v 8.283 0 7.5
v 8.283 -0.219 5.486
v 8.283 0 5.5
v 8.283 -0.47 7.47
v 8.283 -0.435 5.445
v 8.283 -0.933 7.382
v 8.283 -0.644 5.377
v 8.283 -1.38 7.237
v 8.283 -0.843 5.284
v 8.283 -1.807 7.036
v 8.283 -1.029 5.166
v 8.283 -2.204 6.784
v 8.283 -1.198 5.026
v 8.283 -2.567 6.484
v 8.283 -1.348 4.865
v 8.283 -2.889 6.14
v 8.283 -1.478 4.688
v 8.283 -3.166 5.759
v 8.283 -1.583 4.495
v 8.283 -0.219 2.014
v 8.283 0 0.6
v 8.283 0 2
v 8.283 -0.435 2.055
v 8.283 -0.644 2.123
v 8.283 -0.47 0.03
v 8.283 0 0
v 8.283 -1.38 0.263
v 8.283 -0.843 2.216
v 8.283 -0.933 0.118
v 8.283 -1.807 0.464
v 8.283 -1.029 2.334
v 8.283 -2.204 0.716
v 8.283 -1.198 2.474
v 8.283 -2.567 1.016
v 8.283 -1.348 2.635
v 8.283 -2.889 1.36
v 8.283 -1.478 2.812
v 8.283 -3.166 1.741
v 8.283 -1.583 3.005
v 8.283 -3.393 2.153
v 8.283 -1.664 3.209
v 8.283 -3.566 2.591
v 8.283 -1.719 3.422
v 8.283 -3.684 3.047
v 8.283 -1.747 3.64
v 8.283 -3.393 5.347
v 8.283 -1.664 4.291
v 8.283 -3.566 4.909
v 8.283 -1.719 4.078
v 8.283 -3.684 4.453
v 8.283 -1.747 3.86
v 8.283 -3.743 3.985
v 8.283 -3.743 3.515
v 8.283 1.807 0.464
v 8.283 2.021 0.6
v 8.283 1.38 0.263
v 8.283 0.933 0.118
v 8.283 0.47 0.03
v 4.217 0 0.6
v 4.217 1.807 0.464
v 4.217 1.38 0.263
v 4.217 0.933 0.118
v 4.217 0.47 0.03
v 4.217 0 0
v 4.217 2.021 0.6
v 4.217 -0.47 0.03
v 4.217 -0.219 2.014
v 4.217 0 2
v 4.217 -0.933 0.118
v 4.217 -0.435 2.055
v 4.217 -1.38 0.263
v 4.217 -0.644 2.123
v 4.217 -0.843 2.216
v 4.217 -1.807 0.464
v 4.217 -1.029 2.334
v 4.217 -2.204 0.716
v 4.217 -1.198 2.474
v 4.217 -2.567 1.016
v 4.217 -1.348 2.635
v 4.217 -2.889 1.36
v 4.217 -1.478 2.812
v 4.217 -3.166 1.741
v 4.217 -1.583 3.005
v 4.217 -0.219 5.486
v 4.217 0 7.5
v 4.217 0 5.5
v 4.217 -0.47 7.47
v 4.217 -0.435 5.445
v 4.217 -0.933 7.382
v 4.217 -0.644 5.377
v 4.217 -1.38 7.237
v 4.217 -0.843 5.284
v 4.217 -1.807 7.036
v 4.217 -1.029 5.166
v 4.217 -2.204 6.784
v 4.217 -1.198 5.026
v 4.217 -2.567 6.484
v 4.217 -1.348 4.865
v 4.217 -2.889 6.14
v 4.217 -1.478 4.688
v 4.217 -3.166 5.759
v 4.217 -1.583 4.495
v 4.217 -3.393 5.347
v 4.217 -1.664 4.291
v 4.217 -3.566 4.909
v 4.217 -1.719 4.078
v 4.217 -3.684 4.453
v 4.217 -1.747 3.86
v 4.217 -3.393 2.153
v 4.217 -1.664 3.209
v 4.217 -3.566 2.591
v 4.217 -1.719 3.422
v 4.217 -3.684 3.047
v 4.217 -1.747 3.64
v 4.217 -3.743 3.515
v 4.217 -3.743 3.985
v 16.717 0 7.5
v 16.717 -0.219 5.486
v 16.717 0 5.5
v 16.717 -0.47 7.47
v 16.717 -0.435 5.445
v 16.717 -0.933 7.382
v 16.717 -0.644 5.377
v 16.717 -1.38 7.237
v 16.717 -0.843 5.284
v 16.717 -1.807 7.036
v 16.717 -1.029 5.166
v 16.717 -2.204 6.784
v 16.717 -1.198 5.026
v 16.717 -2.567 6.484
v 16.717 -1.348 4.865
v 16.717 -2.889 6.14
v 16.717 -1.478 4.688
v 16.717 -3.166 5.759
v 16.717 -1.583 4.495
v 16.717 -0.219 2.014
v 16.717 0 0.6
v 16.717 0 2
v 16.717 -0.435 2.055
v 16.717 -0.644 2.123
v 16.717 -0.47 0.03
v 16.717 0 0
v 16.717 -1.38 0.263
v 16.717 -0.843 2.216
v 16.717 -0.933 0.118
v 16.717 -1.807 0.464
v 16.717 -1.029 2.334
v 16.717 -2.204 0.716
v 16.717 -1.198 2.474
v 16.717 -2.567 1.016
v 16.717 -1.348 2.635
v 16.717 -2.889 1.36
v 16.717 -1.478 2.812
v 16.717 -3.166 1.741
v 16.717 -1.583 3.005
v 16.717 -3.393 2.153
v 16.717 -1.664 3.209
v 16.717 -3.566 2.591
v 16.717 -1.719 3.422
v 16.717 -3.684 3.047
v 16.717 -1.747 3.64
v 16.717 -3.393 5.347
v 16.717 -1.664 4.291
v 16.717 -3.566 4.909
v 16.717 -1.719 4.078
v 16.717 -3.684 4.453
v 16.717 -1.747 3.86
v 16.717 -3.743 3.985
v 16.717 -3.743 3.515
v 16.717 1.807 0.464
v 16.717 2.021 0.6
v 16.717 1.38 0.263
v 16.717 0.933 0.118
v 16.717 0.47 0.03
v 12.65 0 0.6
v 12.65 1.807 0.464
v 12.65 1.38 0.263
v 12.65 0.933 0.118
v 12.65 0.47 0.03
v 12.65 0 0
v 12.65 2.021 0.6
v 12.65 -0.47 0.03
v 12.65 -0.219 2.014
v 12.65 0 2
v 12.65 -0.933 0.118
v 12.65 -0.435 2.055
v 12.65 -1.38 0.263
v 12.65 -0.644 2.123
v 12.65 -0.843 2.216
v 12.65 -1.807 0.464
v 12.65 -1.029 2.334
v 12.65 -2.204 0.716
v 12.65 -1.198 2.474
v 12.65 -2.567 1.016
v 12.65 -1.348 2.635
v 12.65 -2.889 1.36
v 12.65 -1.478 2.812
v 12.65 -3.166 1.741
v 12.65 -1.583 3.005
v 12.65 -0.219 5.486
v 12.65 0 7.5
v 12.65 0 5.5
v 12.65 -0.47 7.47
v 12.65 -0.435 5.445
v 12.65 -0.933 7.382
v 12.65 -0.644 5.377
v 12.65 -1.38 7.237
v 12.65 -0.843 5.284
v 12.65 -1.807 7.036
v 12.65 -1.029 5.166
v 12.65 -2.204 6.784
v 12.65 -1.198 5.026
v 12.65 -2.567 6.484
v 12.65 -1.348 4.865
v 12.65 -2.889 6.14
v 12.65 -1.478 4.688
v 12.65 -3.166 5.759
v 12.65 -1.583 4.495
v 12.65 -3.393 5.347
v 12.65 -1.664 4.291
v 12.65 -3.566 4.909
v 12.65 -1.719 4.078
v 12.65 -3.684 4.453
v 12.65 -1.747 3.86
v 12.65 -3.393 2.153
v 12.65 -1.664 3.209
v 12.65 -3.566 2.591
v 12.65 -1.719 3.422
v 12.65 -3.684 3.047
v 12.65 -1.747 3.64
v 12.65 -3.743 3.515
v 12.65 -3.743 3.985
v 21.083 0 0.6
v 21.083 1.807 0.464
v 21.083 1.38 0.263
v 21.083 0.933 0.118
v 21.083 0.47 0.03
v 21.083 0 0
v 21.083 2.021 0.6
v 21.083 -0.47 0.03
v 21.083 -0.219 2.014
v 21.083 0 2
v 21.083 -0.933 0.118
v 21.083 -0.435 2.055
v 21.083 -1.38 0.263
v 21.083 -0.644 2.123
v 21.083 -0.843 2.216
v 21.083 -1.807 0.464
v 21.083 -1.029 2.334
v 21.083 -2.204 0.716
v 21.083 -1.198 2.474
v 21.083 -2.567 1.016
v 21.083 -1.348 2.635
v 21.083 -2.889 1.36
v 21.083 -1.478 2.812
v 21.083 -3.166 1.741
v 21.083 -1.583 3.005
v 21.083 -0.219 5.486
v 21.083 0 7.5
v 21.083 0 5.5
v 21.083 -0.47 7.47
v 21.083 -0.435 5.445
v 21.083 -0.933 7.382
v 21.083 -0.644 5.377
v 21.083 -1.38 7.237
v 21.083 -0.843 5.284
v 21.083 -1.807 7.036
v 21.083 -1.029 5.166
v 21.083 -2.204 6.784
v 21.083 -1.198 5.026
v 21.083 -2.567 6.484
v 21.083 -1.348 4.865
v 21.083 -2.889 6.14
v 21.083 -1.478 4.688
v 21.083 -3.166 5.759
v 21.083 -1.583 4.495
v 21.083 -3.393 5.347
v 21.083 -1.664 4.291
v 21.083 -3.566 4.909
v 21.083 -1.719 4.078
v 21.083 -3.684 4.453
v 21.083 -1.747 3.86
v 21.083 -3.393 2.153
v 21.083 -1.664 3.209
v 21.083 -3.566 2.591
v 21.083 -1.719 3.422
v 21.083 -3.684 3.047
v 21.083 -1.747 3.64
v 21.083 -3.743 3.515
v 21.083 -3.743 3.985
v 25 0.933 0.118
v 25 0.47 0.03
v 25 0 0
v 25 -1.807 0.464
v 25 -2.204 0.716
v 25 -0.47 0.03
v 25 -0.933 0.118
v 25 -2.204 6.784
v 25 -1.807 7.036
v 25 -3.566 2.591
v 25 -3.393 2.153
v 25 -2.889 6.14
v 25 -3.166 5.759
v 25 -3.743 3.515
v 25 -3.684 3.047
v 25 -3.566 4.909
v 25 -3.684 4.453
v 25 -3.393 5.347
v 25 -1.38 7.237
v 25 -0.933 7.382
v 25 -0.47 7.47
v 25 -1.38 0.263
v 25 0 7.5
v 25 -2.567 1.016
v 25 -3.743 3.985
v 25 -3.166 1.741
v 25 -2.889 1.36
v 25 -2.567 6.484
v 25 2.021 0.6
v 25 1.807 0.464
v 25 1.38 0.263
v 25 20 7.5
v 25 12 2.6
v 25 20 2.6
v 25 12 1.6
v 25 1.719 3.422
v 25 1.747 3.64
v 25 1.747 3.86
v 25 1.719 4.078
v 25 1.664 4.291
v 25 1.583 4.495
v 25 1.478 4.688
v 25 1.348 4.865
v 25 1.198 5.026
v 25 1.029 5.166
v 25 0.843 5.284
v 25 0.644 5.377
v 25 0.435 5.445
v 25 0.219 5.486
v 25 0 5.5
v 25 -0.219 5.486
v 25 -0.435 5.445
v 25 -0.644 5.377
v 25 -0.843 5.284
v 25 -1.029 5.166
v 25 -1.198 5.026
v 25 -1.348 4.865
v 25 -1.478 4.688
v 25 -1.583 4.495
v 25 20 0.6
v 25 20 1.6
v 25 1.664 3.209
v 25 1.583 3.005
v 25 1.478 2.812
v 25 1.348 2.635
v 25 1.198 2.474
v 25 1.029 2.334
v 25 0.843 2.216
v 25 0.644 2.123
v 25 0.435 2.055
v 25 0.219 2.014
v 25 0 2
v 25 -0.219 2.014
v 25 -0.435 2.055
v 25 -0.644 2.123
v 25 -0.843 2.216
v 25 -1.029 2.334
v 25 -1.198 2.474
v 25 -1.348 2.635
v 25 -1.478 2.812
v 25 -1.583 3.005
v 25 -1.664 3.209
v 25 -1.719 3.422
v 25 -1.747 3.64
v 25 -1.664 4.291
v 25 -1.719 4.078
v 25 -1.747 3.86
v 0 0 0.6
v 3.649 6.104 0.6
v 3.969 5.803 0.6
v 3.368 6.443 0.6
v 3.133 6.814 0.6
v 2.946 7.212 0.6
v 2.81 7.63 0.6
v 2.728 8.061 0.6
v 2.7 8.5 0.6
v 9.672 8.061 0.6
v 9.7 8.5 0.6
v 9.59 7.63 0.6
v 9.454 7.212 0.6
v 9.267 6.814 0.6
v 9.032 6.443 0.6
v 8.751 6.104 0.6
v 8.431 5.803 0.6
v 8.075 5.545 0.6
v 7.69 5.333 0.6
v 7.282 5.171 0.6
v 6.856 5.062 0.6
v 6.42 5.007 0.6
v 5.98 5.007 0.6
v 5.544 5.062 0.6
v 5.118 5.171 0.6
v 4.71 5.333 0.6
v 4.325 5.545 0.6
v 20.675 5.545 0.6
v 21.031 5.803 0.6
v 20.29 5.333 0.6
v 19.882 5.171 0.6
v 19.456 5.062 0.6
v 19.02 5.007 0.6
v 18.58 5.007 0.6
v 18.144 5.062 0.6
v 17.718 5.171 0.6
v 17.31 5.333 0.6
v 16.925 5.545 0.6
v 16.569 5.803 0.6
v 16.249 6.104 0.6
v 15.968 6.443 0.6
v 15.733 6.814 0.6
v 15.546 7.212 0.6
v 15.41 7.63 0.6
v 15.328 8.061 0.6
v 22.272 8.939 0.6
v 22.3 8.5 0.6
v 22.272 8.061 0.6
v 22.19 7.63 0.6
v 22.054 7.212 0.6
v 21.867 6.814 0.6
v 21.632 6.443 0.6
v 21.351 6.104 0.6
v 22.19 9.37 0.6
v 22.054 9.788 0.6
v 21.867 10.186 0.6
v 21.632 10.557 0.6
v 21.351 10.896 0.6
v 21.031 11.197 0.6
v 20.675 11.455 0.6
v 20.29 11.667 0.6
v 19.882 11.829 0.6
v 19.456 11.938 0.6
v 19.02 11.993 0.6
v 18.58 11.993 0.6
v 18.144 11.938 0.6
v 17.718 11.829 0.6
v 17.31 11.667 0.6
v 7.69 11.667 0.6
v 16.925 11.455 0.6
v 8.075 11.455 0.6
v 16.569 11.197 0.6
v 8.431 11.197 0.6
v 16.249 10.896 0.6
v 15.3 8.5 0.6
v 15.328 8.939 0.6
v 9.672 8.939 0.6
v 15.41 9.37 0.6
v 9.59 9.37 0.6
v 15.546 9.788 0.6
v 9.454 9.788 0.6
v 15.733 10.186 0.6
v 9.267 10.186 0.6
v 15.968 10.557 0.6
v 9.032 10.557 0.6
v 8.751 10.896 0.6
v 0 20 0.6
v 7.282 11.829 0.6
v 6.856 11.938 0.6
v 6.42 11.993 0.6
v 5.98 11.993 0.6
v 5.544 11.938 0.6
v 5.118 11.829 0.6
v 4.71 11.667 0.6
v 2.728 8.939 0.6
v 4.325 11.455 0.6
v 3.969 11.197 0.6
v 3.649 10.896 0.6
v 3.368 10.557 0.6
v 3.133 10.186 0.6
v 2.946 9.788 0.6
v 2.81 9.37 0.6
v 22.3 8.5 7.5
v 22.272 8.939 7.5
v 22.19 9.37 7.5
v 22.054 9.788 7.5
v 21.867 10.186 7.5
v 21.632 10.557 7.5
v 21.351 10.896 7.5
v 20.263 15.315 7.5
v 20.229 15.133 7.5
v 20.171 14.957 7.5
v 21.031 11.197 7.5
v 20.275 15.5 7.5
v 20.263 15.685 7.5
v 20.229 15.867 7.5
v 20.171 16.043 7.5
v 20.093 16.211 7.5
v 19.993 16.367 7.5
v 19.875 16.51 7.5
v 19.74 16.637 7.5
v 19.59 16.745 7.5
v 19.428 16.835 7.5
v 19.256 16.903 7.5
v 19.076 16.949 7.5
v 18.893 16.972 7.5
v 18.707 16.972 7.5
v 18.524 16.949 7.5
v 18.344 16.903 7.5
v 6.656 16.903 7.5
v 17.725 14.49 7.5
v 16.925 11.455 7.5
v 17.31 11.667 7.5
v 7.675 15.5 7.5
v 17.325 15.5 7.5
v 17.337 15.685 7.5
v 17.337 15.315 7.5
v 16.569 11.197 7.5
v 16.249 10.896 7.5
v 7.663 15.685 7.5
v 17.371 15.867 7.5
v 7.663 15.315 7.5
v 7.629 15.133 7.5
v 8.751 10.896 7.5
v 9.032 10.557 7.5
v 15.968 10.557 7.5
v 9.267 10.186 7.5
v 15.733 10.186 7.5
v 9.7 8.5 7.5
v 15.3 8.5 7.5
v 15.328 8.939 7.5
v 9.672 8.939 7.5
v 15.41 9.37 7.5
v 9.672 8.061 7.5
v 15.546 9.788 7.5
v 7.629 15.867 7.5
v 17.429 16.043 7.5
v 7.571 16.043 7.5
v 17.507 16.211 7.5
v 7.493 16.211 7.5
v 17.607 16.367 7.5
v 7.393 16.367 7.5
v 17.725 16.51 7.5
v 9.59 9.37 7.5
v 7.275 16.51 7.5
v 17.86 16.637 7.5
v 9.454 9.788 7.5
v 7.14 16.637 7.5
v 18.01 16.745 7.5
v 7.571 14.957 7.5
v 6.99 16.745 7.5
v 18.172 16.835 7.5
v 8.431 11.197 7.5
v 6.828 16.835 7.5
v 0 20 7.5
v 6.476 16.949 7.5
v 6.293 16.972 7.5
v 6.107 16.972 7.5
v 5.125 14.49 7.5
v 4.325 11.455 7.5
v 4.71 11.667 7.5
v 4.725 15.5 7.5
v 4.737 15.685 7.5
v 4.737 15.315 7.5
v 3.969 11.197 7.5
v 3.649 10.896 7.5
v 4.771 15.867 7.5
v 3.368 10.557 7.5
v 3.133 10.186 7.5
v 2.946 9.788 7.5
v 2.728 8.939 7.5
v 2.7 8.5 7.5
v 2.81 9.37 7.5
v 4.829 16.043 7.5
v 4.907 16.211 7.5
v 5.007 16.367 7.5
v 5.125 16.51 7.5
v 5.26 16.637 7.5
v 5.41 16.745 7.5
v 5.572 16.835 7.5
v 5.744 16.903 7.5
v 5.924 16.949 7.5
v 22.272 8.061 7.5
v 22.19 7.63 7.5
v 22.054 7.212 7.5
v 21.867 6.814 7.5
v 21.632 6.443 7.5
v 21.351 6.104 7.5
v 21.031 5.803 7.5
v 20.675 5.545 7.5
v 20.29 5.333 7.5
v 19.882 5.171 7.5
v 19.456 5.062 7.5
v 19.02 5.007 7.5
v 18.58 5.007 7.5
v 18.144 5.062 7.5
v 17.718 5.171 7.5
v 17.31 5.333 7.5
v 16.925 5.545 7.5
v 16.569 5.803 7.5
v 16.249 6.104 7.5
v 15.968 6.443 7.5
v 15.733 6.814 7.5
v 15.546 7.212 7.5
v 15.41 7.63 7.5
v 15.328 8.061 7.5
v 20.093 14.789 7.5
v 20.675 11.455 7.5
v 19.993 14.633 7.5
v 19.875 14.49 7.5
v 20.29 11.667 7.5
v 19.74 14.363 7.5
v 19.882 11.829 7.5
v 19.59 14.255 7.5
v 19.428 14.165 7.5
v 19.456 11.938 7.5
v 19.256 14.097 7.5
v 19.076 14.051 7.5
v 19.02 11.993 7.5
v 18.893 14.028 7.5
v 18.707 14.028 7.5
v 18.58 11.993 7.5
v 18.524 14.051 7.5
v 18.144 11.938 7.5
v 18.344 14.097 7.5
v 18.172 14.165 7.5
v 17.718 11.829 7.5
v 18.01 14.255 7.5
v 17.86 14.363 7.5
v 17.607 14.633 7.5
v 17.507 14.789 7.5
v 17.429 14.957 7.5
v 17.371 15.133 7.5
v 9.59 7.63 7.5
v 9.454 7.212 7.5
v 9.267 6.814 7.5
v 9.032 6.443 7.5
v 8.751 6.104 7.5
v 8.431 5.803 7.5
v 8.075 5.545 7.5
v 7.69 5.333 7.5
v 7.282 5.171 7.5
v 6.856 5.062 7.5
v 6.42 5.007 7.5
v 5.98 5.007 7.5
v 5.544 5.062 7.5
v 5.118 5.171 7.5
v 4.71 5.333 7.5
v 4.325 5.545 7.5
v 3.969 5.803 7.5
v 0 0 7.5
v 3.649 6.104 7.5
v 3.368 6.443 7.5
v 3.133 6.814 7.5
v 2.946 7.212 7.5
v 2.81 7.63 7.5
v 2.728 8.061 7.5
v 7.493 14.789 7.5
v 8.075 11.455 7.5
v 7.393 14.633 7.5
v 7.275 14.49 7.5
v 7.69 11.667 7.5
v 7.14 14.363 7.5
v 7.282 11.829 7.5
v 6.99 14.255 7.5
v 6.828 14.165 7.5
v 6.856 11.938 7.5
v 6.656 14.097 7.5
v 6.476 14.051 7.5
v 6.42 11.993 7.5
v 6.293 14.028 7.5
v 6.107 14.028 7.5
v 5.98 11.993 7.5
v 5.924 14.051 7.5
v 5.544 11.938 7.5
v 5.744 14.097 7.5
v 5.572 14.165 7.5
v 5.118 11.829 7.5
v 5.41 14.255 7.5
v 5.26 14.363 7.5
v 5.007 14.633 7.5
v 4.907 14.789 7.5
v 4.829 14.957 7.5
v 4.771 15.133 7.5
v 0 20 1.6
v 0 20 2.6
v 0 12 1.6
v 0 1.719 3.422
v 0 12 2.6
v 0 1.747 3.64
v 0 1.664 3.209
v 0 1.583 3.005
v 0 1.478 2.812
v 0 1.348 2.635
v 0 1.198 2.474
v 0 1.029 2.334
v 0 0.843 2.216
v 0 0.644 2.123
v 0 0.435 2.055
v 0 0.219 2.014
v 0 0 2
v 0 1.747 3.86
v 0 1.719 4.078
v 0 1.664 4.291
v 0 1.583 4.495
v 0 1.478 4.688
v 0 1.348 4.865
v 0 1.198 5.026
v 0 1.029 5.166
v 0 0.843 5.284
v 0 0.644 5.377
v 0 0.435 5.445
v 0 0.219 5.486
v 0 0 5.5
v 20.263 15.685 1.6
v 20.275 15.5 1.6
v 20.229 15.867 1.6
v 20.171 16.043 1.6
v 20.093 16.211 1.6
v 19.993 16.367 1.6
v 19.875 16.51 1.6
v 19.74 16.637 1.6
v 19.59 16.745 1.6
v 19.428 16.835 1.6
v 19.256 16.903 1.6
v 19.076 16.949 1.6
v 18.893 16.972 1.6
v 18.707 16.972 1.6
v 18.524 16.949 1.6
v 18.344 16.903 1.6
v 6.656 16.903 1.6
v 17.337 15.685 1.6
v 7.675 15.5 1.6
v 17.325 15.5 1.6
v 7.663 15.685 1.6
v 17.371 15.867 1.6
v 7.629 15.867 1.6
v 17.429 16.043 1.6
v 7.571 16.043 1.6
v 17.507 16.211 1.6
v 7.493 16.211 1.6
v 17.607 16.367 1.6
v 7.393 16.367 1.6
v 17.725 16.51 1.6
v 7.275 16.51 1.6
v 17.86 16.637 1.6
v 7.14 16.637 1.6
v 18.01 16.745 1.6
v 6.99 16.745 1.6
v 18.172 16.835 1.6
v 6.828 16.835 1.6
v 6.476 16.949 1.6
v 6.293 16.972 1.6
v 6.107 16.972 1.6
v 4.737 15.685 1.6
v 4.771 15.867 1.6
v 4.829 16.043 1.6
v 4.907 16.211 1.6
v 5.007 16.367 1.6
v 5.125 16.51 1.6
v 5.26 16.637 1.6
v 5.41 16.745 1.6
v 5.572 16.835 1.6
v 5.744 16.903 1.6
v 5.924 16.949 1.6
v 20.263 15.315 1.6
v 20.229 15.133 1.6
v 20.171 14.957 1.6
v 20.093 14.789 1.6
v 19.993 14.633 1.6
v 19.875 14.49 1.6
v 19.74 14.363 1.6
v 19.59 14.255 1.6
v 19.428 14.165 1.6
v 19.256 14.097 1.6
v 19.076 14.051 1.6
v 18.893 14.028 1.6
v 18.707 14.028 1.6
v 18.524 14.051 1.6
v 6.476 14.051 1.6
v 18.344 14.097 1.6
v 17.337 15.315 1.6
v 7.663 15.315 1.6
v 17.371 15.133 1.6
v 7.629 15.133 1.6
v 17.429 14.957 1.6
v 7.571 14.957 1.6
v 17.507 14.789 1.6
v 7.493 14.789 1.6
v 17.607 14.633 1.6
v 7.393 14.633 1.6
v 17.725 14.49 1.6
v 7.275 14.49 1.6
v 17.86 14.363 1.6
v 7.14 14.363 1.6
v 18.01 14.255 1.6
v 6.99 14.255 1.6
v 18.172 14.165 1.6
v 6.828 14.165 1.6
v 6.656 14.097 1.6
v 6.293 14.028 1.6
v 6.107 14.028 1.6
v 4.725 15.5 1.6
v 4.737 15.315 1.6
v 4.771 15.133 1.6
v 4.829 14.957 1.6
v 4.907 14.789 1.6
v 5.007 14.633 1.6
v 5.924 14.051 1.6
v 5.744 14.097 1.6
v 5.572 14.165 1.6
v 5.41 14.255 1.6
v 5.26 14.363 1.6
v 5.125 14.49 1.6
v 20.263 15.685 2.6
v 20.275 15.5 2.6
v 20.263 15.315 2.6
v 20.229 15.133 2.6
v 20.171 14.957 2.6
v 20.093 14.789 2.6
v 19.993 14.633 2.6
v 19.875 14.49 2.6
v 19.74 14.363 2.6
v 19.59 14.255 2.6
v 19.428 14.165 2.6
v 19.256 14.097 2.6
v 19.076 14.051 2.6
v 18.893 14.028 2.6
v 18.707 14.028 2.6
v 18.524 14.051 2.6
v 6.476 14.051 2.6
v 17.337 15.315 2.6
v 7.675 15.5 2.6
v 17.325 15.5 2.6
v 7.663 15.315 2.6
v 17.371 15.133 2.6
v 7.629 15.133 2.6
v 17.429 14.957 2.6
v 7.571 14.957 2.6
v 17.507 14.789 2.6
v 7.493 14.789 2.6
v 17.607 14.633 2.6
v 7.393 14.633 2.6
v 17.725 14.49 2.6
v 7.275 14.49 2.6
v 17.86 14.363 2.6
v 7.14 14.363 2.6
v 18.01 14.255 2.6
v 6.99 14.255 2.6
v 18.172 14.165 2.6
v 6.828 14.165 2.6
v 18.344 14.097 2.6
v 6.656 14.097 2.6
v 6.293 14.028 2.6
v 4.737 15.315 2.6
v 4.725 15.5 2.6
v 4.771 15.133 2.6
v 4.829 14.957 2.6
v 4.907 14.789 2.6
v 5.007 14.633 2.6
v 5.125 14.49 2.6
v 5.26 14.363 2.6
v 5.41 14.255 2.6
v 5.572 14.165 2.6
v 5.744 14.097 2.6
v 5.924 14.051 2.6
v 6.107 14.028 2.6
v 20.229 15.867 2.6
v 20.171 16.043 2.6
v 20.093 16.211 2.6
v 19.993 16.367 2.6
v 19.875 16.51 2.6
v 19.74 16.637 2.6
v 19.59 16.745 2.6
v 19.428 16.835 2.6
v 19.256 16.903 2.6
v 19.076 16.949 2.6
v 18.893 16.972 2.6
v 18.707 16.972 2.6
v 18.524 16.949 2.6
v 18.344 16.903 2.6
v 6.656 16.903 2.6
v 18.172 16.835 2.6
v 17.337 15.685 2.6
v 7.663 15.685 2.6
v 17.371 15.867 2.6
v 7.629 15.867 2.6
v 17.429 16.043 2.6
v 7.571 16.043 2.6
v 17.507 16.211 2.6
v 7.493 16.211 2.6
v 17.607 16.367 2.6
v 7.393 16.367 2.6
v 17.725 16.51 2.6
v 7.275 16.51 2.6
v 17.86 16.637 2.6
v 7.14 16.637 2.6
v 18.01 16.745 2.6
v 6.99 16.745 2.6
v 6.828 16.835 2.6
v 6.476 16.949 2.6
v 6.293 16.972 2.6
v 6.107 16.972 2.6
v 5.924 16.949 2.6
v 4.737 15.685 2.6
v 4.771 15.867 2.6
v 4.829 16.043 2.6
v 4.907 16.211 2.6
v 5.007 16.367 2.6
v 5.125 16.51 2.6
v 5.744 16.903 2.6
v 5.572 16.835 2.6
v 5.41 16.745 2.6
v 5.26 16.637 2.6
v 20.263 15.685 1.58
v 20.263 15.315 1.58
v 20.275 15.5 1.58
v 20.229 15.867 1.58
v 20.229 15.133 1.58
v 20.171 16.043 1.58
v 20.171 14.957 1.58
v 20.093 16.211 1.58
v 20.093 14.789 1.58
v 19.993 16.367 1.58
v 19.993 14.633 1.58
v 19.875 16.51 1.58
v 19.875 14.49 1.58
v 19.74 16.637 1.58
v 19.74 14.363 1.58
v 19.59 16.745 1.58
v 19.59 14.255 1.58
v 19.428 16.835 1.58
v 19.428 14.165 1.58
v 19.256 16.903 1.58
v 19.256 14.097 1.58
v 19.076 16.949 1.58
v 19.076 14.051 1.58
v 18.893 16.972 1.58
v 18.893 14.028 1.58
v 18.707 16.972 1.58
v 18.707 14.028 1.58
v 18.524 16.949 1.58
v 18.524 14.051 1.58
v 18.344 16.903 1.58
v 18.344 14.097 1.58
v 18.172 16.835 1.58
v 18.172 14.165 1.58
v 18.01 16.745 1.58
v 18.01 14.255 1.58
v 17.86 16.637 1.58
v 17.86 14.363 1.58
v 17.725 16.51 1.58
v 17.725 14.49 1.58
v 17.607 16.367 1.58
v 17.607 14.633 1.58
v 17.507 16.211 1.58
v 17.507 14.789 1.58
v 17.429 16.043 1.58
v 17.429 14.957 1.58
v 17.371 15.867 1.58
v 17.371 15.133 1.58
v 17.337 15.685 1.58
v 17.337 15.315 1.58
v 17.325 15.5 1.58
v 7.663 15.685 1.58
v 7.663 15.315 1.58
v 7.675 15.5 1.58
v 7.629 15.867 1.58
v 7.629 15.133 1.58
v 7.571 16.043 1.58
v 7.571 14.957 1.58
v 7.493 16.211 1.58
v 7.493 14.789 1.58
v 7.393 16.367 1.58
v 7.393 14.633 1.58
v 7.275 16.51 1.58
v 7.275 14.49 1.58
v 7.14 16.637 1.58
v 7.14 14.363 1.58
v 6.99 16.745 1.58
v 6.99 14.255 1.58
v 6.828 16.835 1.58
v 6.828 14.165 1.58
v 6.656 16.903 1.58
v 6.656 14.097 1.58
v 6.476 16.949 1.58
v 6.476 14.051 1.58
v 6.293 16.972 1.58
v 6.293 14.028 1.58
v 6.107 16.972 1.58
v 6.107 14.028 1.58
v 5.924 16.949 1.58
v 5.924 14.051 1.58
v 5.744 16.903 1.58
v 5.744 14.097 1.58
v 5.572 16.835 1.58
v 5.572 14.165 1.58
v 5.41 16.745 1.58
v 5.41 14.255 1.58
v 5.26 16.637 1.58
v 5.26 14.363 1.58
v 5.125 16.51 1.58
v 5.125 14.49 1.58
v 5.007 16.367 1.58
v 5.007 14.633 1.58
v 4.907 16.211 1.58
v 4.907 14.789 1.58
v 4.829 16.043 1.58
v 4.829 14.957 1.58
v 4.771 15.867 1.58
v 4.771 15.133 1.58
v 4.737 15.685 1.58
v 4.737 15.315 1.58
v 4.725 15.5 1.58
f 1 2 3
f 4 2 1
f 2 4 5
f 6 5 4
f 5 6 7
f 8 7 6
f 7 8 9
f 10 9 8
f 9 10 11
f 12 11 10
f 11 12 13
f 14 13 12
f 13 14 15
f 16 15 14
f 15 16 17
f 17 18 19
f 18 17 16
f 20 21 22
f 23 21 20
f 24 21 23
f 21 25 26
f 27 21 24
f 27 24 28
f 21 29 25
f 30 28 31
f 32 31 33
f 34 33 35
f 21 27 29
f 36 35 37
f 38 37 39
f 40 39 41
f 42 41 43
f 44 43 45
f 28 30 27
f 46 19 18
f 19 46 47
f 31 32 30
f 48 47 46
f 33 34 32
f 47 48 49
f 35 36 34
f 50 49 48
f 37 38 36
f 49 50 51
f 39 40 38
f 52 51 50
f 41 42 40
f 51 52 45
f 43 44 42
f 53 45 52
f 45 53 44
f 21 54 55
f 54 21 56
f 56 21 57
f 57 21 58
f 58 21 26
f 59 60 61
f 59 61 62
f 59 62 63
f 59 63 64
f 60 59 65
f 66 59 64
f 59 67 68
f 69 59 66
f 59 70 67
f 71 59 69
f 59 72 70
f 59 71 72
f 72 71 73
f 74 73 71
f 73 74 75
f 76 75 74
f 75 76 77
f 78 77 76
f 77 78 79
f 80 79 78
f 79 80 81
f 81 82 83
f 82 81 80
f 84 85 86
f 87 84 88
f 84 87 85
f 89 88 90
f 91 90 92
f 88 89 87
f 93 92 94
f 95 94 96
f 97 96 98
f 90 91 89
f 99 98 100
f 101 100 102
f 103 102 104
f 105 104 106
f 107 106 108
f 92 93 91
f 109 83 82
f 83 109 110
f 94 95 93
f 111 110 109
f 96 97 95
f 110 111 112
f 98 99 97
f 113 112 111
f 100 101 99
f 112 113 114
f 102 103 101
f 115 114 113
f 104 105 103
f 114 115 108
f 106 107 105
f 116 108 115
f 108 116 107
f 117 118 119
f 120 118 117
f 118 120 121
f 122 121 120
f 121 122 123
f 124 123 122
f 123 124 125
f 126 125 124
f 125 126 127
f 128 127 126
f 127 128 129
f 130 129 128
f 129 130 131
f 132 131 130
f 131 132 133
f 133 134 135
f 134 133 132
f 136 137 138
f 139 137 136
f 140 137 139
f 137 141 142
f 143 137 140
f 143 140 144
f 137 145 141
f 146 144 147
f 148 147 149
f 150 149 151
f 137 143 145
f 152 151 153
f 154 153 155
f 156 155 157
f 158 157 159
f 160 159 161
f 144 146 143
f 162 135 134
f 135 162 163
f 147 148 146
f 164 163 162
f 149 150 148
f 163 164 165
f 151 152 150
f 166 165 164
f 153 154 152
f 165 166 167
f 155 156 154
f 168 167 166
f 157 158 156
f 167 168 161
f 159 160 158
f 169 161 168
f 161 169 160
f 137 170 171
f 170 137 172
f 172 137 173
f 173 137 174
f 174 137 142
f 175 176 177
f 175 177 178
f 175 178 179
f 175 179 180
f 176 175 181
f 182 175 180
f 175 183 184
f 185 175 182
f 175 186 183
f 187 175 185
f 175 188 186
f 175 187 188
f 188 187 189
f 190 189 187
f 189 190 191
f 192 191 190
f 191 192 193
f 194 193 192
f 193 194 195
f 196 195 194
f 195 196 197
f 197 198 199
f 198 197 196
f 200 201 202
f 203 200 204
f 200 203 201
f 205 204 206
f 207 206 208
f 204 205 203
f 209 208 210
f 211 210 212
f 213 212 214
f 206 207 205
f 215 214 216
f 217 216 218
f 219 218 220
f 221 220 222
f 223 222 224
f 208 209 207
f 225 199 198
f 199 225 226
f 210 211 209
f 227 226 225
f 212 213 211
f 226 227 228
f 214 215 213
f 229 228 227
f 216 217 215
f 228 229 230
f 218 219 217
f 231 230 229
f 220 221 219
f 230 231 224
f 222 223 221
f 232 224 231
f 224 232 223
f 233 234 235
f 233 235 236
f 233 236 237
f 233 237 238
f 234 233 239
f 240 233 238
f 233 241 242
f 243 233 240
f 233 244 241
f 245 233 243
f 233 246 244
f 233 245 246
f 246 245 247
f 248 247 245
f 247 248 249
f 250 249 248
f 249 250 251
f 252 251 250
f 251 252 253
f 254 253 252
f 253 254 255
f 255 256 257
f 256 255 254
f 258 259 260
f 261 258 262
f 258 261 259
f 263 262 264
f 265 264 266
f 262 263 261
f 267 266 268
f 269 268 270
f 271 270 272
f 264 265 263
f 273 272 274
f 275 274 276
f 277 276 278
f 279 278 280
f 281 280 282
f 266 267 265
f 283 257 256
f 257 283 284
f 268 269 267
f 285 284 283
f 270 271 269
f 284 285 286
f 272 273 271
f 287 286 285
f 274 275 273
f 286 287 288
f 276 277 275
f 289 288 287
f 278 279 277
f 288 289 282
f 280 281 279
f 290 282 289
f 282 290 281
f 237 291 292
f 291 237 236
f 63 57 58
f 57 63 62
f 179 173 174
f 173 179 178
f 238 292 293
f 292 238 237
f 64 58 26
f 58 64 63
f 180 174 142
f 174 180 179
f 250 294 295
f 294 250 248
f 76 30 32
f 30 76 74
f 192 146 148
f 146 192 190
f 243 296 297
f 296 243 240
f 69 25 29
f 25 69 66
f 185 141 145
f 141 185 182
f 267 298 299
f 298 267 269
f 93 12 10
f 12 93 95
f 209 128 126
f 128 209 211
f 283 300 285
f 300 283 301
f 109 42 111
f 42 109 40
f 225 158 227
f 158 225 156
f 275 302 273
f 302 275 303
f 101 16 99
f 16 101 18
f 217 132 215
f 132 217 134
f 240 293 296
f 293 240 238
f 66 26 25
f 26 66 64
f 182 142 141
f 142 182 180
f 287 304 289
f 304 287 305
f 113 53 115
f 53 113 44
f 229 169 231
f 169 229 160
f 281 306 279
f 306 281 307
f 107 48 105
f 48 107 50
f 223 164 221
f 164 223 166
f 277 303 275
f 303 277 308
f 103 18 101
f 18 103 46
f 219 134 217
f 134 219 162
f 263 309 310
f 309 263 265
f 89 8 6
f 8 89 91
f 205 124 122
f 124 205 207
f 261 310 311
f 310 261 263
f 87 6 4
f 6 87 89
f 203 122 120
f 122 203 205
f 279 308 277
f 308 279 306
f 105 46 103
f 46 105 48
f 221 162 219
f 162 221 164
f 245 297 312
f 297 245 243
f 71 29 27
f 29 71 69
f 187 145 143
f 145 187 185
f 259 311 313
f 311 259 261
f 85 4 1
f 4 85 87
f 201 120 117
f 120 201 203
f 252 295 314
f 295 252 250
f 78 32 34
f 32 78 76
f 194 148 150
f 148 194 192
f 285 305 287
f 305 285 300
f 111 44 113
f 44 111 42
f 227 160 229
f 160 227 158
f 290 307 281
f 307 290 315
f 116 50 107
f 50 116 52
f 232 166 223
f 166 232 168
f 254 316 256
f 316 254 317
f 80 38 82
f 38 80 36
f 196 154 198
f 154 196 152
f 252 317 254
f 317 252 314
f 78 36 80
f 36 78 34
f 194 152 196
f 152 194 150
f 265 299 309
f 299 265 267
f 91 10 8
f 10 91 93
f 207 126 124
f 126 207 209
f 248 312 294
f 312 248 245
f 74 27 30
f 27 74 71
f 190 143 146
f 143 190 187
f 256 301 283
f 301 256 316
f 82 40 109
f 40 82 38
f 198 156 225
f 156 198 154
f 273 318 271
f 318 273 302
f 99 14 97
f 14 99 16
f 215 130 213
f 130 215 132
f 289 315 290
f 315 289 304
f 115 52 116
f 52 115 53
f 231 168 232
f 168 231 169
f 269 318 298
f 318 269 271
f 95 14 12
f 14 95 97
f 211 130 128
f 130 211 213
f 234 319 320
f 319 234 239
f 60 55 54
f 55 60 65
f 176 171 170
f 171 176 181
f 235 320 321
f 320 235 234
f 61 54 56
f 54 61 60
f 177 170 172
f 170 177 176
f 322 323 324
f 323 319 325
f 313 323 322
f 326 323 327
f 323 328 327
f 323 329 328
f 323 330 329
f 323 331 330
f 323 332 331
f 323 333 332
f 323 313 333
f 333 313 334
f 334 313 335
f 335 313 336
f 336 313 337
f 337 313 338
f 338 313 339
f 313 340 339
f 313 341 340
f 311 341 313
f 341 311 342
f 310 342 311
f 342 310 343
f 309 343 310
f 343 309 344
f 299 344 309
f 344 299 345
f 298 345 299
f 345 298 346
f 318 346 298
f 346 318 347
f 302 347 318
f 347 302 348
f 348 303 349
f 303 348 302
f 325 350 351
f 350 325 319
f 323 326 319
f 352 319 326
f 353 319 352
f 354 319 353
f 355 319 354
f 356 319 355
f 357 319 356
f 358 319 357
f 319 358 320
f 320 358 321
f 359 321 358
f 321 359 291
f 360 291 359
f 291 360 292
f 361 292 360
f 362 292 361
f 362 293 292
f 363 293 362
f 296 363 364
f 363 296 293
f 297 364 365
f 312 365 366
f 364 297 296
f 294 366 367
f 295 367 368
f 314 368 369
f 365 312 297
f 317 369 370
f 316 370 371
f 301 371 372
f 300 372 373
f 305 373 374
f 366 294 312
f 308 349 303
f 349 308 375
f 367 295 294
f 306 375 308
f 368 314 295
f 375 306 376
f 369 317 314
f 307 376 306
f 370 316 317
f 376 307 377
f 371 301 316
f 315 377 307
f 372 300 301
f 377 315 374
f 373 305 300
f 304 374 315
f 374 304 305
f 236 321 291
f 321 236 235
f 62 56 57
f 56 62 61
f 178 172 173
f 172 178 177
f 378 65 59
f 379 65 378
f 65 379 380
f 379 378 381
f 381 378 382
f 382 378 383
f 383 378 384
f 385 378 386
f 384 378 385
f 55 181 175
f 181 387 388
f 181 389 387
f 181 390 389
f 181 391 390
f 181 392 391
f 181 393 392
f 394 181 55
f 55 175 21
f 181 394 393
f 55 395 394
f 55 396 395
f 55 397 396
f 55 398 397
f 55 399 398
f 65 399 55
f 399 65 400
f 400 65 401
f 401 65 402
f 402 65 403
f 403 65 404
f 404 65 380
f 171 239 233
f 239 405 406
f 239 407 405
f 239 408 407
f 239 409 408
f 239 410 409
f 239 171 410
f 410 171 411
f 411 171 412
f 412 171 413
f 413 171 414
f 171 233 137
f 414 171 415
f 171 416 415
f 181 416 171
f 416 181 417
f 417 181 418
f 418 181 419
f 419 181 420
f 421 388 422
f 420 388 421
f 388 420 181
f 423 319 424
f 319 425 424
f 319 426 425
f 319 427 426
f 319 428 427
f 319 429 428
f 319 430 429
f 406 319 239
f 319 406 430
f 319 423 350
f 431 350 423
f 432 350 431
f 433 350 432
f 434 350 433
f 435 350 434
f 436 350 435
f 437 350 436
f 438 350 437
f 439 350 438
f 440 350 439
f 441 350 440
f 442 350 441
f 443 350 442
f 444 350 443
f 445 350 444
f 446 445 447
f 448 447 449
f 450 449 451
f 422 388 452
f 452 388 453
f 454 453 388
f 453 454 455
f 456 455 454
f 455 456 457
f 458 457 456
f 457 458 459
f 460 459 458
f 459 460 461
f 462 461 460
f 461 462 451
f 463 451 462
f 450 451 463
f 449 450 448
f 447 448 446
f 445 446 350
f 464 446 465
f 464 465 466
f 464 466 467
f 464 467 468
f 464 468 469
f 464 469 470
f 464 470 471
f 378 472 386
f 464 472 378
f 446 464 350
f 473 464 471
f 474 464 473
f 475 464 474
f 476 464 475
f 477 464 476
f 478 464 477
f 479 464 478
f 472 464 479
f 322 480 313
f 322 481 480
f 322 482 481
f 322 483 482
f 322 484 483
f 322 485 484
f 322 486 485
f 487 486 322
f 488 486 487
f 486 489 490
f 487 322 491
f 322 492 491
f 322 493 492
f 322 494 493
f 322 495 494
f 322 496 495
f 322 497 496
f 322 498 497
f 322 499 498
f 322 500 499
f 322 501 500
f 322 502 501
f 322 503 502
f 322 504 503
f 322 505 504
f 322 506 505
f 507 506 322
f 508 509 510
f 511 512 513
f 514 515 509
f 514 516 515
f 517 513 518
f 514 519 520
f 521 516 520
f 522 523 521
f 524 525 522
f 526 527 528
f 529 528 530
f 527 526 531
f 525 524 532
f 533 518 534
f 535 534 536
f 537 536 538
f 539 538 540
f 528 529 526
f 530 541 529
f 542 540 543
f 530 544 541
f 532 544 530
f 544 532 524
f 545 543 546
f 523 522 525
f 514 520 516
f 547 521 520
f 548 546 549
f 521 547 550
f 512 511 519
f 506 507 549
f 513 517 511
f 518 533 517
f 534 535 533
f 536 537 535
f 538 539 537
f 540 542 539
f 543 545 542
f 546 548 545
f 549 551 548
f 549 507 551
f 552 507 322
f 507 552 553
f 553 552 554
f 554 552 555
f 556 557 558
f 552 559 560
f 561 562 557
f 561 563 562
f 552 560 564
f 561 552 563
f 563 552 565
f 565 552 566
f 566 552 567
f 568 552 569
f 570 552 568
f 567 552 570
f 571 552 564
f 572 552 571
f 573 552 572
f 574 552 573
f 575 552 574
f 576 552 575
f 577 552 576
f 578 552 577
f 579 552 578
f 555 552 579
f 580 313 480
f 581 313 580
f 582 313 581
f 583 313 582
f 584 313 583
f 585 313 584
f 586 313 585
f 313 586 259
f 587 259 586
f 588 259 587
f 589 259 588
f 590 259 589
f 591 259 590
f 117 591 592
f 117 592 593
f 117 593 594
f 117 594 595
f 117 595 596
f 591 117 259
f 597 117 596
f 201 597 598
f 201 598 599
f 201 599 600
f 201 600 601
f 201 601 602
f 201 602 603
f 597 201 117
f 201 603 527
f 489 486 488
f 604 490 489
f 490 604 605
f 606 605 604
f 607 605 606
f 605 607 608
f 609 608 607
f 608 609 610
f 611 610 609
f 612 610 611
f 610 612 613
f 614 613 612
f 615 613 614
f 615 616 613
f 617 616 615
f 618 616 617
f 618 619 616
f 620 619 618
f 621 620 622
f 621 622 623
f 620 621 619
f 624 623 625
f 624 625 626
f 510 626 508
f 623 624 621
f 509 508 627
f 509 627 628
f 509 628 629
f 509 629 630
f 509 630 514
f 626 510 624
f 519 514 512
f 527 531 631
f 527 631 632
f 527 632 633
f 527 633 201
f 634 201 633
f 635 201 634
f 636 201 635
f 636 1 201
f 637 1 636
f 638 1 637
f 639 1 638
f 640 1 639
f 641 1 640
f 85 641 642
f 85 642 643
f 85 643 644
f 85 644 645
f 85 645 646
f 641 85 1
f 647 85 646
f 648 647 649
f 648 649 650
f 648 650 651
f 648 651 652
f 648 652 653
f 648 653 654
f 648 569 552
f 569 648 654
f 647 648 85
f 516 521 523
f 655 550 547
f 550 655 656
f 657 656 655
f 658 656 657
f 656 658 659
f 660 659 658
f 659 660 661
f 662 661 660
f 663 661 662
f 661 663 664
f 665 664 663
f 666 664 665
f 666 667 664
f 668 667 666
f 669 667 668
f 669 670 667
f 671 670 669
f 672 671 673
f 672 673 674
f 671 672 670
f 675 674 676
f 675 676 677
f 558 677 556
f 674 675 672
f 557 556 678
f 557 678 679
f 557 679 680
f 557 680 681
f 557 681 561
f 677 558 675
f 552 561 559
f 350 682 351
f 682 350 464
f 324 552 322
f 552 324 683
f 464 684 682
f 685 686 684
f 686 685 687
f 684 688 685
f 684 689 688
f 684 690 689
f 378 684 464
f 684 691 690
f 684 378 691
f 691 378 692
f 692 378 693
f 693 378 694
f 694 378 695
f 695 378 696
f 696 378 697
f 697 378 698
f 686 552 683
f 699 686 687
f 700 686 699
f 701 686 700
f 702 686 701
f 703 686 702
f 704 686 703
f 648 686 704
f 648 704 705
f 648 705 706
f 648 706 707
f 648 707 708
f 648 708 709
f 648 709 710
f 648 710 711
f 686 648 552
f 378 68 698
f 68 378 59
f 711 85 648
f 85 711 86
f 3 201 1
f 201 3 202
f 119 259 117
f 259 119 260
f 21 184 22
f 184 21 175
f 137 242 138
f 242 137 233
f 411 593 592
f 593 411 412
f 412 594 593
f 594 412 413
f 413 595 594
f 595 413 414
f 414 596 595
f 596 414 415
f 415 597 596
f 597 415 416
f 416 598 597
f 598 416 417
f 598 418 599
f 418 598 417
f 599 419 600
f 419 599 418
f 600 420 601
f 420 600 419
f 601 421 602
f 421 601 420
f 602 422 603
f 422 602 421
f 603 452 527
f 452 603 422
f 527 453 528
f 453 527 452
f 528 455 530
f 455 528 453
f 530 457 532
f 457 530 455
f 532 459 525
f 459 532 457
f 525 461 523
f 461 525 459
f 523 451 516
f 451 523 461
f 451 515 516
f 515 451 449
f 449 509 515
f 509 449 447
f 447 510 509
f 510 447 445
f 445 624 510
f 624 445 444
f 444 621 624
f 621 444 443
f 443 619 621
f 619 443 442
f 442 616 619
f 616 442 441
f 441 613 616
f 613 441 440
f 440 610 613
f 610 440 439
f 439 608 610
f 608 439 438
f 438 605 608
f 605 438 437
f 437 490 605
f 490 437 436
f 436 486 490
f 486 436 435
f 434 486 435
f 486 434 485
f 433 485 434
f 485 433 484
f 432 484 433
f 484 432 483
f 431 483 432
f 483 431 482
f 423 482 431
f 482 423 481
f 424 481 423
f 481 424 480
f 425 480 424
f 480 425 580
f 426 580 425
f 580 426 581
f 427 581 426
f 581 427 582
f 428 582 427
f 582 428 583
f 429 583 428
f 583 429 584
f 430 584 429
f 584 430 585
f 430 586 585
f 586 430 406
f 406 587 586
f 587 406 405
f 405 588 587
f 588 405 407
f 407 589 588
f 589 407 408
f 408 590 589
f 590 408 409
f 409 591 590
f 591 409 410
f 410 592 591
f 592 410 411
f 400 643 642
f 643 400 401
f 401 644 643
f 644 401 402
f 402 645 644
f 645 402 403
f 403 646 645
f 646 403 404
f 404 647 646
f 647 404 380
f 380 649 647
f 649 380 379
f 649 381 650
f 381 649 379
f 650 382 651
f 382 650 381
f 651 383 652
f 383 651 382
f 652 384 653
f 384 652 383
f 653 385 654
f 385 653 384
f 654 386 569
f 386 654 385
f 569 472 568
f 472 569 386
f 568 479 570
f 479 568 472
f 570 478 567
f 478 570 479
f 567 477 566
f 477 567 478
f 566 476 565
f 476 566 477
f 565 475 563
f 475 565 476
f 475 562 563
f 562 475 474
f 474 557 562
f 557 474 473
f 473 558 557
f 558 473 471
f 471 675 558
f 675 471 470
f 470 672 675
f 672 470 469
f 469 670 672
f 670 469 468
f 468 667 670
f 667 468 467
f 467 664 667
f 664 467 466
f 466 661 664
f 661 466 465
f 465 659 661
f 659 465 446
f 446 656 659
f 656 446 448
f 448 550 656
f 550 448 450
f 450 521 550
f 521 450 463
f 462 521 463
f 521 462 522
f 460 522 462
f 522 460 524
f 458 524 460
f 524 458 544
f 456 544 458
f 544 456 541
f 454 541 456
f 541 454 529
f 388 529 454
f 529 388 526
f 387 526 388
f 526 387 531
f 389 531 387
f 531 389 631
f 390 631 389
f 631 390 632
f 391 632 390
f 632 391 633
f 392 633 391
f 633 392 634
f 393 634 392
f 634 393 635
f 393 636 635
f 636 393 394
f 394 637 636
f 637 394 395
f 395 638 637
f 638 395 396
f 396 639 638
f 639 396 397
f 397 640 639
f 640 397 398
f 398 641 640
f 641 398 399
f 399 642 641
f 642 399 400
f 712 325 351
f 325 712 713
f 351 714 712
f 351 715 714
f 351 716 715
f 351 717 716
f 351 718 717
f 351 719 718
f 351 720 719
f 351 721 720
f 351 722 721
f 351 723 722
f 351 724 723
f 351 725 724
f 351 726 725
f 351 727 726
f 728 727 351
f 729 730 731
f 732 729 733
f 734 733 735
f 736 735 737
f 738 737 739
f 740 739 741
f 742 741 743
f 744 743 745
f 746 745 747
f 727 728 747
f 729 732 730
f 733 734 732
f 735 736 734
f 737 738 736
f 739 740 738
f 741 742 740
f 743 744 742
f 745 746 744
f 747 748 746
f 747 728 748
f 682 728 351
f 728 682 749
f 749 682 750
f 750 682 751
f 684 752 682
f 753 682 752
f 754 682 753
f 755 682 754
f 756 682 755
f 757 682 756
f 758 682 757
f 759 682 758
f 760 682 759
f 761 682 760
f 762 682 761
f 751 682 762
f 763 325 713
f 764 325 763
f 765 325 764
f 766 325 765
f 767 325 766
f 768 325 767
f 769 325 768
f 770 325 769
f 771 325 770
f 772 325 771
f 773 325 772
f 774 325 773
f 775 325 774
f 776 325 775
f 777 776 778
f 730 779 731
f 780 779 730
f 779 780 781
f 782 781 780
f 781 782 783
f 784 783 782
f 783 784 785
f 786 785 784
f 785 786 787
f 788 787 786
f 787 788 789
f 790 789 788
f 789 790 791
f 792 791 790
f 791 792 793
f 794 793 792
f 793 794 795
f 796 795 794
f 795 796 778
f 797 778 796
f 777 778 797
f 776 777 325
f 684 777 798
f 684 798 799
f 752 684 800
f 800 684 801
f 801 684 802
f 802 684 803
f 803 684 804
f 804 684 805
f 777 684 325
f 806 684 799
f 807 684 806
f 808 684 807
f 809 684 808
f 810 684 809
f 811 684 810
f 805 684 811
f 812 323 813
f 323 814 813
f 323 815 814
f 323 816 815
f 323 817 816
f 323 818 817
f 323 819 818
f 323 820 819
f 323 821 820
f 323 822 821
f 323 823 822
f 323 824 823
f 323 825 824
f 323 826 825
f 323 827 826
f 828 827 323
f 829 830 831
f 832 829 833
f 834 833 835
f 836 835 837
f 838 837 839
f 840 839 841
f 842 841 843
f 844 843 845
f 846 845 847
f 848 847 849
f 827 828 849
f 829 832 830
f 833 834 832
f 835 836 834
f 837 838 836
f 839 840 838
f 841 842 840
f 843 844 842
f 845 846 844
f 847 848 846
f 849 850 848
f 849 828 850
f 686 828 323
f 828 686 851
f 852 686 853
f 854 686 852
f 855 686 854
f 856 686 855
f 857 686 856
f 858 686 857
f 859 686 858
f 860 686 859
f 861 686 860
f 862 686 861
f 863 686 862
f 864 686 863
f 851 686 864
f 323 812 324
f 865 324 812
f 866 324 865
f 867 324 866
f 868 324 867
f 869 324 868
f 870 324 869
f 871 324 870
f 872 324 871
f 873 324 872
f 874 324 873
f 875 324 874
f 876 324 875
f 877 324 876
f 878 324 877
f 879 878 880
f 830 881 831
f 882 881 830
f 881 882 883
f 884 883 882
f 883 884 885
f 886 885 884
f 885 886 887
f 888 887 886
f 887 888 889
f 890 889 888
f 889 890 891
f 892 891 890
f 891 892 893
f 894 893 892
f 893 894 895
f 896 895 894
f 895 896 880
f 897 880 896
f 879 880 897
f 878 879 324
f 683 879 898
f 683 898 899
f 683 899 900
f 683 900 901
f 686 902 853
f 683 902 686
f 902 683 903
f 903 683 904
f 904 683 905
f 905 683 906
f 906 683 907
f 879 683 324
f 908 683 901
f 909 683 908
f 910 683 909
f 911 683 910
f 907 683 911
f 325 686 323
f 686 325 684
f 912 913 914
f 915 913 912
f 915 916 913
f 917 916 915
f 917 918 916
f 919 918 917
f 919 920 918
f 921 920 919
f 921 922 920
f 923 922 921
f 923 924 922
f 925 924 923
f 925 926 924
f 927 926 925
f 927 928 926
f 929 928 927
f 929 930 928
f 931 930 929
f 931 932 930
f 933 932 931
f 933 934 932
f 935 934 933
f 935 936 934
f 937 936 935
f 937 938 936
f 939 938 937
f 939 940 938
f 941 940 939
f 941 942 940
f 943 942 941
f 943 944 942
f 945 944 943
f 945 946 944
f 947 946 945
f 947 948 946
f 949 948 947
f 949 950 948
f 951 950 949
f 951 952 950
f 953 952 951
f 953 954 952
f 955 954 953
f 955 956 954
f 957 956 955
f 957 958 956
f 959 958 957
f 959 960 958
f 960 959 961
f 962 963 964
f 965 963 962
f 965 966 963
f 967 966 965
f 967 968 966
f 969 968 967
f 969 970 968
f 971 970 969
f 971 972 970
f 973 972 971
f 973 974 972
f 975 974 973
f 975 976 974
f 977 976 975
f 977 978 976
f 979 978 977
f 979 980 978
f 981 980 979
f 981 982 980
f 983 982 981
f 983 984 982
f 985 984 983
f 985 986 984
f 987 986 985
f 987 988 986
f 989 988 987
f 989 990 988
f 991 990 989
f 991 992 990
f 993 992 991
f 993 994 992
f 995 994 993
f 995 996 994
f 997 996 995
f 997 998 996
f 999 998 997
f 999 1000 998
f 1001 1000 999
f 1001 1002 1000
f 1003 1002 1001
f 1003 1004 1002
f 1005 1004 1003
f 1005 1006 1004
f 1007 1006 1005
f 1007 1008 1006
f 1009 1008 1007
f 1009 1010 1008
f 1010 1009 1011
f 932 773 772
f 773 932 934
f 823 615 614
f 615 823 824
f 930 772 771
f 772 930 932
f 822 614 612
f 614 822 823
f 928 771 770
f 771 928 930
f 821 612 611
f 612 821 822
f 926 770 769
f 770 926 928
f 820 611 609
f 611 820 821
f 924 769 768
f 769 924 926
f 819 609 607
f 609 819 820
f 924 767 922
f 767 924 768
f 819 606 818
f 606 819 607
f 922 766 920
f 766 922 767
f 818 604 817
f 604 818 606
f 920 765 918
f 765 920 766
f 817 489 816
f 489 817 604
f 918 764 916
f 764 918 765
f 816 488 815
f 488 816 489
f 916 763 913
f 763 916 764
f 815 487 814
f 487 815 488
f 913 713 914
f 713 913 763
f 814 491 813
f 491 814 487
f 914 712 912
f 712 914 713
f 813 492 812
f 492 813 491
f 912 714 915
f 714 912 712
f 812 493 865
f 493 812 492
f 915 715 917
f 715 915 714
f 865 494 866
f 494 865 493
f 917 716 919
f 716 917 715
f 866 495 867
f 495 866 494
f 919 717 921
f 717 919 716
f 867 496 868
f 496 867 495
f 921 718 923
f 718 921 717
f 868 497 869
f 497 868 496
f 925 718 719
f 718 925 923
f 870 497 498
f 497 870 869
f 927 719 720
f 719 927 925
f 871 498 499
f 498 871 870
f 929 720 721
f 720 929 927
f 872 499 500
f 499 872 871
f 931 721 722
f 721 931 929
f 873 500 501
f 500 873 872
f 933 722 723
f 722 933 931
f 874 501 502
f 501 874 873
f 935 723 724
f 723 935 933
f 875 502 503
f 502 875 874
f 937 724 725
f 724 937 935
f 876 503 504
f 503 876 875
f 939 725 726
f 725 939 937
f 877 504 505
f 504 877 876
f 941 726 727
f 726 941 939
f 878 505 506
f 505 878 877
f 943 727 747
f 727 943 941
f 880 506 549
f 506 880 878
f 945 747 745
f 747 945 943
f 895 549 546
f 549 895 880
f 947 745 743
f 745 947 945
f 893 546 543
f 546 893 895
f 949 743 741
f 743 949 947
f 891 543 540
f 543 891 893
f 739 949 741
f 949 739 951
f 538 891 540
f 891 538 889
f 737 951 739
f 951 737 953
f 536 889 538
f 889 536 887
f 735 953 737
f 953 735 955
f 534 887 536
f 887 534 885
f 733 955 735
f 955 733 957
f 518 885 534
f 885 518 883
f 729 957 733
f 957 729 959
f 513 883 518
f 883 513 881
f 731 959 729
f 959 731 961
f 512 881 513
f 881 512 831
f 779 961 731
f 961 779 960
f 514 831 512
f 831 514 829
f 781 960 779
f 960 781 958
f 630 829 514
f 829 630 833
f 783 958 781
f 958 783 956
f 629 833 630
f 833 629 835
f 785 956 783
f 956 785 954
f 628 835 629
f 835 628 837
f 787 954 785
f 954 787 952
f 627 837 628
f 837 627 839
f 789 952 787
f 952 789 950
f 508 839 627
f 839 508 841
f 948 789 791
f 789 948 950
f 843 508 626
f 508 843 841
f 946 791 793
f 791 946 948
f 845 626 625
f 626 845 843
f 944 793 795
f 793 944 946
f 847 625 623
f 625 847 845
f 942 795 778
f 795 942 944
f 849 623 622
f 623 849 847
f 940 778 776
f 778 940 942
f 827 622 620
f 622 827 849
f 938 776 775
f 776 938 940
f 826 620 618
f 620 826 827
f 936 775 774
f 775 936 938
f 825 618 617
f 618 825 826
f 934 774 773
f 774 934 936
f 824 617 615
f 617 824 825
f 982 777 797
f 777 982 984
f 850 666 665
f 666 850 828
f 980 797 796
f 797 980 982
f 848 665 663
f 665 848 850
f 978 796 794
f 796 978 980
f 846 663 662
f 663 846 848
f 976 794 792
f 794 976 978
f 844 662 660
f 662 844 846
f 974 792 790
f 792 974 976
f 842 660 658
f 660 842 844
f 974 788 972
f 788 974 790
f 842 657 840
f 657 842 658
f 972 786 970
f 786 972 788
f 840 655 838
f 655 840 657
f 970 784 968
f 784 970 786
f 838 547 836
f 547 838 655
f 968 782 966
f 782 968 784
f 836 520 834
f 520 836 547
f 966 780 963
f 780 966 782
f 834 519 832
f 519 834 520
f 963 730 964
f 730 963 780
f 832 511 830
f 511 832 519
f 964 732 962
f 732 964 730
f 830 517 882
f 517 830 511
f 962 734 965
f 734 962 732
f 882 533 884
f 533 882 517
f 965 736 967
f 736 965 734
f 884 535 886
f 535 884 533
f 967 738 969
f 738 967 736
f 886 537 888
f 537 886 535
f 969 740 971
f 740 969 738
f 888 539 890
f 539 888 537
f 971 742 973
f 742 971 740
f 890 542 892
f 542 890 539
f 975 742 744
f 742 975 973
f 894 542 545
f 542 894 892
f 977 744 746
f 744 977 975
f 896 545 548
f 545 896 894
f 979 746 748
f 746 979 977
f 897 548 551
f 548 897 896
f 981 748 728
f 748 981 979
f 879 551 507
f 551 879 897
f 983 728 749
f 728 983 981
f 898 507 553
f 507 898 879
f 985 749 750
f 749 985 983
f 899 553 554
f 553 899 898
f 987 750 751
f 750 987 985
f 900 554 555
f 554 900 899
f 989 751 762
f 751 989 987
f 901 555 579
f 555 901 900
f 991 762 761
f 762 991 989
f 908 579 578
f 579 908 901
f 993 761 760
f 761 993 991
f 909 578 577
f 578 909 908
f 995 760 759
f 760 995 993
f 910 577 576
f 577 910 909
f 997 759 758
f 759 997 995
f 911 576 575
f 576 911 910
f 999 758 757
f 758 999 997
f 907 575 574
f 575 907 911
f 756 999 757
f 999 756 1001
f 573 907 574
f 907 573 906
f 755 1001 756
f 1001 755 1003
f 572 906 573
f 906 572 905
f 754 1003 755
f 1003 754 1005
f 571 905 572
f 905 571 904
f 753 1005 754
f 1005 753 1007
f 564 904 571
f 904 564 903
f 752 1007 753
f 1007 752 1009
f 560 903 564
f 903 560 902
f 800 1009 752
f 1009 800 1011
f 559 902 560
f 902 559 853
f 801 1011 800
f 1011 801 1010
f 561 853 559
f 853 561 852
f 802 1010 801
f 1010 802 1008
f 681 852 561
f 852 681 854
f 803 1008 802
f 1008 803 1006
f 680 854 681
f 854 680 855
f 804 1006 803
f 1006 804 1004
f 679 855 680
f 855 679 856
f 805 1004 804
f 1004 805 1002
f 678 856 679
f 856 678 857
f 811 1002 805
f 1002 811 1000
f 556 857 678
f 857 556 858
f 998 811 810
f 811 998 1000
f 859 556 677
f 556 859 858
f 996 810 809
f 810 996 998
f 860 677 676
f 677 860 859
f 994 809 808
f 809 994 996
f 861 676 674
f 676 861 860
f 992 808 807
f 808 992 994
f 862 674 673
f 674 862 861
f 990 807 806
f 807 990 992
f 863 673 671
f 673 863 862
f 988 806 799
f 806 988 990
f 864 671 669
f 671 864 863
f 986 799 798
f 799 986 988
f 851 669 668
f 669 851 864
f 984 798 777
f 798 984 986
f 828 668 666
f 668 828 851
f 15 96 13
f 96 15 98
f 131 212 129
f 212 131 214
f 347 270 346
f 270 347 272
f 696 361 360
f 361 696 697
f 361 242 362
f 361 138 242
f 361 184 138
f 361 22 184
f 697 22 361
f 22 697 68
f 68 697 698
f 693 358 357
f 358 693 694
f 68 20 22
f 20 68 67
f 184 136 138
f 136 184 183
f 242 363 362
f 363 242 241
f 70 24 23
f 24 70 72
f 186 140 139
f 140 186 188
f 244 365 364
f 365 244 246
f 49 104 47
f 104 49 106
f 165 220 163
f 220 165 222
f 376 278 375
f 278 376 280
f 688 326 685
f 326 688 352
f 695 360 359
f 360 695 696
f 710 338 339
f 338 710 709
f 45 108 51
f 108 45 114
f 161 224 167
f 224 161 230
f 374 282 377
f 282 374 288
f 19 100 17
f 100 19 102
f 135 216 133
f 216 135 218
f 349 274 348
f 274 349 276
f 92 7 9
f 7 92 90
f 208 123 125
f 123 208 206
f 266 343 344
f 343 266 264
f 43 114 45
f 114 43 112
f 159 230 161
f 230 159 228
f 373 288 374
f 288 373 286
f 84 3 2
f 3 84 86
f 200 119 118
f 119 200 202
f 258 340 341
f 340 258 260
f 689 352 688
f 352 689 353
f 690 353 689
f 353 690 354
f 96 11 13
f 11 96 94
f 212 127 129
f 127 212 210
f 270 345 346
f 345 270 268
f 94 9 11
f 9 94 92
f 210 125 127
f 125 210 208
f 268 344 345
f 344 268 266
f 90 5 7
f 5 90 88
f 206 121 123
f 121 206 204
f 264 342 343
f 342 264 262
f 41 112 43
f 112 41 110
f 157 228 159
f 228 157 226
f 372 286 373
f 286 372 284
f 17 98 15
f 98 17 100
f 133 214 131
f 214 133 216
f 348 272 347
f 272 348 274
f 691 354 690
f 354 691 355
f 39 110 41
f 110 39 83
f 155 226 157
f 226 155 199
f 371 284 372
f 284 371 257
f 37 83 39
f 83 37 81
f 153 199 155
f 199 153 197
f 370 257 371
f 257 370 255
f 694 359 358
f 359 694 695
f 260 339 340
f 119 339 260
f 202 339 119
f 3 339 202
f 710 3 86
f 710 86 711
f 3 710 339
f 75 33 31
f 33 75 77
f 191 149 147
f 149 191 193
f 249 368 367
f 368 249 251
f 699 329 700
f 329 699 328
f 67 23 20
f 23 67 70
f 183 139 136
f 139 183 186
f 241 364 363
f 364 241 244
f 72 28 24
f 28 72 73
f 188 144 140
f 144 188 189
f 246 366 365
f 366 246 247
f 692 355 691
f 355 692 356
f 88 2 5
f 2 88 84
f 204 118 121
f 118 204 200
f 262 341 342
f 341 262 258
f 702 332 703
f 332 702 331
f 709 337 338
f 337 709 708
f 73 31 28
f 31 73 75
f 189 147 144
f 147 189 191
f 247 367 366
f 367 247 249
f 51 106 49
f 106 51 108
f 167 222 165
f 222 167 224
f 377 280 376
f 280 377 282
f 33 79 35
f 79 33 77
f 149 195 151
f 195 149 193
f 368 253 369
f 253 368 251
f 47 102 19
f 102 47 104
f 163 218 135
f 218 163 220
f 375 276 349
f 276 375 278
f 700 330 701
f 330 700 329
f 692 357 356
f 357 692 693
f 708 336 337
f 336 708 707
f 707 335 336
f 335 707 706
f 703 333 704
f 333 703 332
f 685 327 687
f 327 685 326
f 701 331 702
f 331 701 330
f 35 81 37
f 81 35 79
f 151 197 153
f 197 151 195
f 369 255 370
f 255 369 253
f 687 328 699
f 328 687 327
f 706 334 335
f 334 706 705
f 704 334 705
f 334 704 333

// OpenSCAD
// file: common.scad
module __fillet(r) {
   offset(r = +r) {
     offset(delta = -r) {
       children();
     }
   }
}

module __chamfer_corners(r) {
    offset(r = +r) {
        offset(delta = -r) {
            children();
        }
    }
}

module __apply_border(size) {
    translate([size, size]) {
        offset(delta = size) {
            children();
        }
    }
}
// file: config.scad
$fn = 50;

pcb_size = [130, 118, 1.6];
stencil_size = [220, 210];

box_size = [80, 80, 20];
lid_size = [240, 240];
fillet_radius = 10;
wall_thickness = 2;
floor_thickness = 1.5;
bolt_diameter = 3;
bolt_head_clearance = 7;
bolt_head_height = 2.7;
nut_diameter = 7;
nut_height = 4;
lid_thickness = 4;
lid_hole_spacing = 10;
lid_hole_diameter = 3.3;
lid_hole_border = 10;
magnet_size = [6.1, 2.1];
lift_hole_diameter = 20;
vacuum_hole_diameter = 12;
guide_hole_diameter = 4;
guide_peg_length = 15;

screw_post_diameter = bolt_head_clearance + 2;
screw_post_inset = 6.3;
// main file
include <config.scad>
include <common.scad>

hinge_width = 25;
hinge_length = 20;
hinge_diameter = bolt_head_clearance + 0.5;
hinge_bolt_diameter = 3.5;
hinge_lower_leaf_height = 0.6;
hinge_split_count = 6;
stencil_slot_height = 1;

hinge_mounting_hole_offset = hinge_diameter + 1;
hinge_mounting_hole_offset_2 = bolt_head_clearance;
hinge_upper_leaf_height = hinge_diameter - hinge_lower_leaf_height;
hinge_split_width = hinge_width / hinge_split_count;


module __hinge() {
    translate([0, 0, hinge_diameter / 2]) {
        rotate([0, 90, 0]) {
            linear_extrude(hinge_width) {
                circle(d=hinge_diameter);
            }
        }
    }
}

module __hinge_rod_hole() {
    translate([-0.02, 0, hinge_diameter / 2]) {
        rotate([0, 90, 0]) {
            linear_extrude(hinge_width + 0.04) {
                circle(d=hinge_bolt_diameter);
            }
        }
    }
}

module __hinge_splits(start) {
    translate([0, -hinge_diameter/2, 0]) {
        union() {
            for(n = [start:2:hinge_split_count - 1]) {
                translate([(hinge_split_width + 0.05) * n, 0]) {
                    cube([hinge_split_width - 0.1, hinge_diameter, hinge_diameter]);
                }
            }
        }
    }
}

module __leaf_mounting_holes_outline(d) {
    center = hinge_width / 2;
    translate([center + screw_post_inset, hinge_mounting_hole_offset]) {
        circle(d = d);
    }
    translate([center - screw_post_inset, hinge_mounting_hole_offset]) {
        circle(d = d);
    }
}

module lower_leaf() {
    difference() {
        union() {
            linear_extrude(hinge_lower_leaf_height) {
                difference() {
                    square([hinge_width, hinge_length]);
                    __leaf_mounting_holes_outline(d=bolt_diameter - 0.05);
                }
            }
            intersection() {
                __hinge();
                __hinge_splits(0);
            }
        }
        __hinge_rod_hole();
    }
}

module upper_leaf() {
    color("blue") {
        difference() {
            union() {
                translate([0, 0, hinge_lower_leaf_height]) {
                    linear_extrude(hinge_upper_leaf_height) {
                        difference() {
                            square([hinge_width, hinge_length]);
                            __leaf_mounting_holes_outline(d=bolt_head_clearance);
                        }
                    }
                }
                intersection() {
                    __hinge();
                    __hinge_splits(1);
                }
            }
            translate([-0.02, hinge_mounting_hole_offset + bolt_head_clearance / 2, pcb_size.z]) {
                linear_extrude(stencil_slot_height) {
                    square(hinge_width + 0.02);
                }
            }
            translate([0, hinge_mounting_hole_offset_2, hinge_lower_leaf_height + stencil_slot_height - 0.02]) {
                linear_extrude(10) {
                    __leaf_mounting_holes_outline(bolt_diameter - 0.05);
                }
            }
            __hinge_rod_hole();
        }
    }
}

//lower_leaf();
upper_leaf();
